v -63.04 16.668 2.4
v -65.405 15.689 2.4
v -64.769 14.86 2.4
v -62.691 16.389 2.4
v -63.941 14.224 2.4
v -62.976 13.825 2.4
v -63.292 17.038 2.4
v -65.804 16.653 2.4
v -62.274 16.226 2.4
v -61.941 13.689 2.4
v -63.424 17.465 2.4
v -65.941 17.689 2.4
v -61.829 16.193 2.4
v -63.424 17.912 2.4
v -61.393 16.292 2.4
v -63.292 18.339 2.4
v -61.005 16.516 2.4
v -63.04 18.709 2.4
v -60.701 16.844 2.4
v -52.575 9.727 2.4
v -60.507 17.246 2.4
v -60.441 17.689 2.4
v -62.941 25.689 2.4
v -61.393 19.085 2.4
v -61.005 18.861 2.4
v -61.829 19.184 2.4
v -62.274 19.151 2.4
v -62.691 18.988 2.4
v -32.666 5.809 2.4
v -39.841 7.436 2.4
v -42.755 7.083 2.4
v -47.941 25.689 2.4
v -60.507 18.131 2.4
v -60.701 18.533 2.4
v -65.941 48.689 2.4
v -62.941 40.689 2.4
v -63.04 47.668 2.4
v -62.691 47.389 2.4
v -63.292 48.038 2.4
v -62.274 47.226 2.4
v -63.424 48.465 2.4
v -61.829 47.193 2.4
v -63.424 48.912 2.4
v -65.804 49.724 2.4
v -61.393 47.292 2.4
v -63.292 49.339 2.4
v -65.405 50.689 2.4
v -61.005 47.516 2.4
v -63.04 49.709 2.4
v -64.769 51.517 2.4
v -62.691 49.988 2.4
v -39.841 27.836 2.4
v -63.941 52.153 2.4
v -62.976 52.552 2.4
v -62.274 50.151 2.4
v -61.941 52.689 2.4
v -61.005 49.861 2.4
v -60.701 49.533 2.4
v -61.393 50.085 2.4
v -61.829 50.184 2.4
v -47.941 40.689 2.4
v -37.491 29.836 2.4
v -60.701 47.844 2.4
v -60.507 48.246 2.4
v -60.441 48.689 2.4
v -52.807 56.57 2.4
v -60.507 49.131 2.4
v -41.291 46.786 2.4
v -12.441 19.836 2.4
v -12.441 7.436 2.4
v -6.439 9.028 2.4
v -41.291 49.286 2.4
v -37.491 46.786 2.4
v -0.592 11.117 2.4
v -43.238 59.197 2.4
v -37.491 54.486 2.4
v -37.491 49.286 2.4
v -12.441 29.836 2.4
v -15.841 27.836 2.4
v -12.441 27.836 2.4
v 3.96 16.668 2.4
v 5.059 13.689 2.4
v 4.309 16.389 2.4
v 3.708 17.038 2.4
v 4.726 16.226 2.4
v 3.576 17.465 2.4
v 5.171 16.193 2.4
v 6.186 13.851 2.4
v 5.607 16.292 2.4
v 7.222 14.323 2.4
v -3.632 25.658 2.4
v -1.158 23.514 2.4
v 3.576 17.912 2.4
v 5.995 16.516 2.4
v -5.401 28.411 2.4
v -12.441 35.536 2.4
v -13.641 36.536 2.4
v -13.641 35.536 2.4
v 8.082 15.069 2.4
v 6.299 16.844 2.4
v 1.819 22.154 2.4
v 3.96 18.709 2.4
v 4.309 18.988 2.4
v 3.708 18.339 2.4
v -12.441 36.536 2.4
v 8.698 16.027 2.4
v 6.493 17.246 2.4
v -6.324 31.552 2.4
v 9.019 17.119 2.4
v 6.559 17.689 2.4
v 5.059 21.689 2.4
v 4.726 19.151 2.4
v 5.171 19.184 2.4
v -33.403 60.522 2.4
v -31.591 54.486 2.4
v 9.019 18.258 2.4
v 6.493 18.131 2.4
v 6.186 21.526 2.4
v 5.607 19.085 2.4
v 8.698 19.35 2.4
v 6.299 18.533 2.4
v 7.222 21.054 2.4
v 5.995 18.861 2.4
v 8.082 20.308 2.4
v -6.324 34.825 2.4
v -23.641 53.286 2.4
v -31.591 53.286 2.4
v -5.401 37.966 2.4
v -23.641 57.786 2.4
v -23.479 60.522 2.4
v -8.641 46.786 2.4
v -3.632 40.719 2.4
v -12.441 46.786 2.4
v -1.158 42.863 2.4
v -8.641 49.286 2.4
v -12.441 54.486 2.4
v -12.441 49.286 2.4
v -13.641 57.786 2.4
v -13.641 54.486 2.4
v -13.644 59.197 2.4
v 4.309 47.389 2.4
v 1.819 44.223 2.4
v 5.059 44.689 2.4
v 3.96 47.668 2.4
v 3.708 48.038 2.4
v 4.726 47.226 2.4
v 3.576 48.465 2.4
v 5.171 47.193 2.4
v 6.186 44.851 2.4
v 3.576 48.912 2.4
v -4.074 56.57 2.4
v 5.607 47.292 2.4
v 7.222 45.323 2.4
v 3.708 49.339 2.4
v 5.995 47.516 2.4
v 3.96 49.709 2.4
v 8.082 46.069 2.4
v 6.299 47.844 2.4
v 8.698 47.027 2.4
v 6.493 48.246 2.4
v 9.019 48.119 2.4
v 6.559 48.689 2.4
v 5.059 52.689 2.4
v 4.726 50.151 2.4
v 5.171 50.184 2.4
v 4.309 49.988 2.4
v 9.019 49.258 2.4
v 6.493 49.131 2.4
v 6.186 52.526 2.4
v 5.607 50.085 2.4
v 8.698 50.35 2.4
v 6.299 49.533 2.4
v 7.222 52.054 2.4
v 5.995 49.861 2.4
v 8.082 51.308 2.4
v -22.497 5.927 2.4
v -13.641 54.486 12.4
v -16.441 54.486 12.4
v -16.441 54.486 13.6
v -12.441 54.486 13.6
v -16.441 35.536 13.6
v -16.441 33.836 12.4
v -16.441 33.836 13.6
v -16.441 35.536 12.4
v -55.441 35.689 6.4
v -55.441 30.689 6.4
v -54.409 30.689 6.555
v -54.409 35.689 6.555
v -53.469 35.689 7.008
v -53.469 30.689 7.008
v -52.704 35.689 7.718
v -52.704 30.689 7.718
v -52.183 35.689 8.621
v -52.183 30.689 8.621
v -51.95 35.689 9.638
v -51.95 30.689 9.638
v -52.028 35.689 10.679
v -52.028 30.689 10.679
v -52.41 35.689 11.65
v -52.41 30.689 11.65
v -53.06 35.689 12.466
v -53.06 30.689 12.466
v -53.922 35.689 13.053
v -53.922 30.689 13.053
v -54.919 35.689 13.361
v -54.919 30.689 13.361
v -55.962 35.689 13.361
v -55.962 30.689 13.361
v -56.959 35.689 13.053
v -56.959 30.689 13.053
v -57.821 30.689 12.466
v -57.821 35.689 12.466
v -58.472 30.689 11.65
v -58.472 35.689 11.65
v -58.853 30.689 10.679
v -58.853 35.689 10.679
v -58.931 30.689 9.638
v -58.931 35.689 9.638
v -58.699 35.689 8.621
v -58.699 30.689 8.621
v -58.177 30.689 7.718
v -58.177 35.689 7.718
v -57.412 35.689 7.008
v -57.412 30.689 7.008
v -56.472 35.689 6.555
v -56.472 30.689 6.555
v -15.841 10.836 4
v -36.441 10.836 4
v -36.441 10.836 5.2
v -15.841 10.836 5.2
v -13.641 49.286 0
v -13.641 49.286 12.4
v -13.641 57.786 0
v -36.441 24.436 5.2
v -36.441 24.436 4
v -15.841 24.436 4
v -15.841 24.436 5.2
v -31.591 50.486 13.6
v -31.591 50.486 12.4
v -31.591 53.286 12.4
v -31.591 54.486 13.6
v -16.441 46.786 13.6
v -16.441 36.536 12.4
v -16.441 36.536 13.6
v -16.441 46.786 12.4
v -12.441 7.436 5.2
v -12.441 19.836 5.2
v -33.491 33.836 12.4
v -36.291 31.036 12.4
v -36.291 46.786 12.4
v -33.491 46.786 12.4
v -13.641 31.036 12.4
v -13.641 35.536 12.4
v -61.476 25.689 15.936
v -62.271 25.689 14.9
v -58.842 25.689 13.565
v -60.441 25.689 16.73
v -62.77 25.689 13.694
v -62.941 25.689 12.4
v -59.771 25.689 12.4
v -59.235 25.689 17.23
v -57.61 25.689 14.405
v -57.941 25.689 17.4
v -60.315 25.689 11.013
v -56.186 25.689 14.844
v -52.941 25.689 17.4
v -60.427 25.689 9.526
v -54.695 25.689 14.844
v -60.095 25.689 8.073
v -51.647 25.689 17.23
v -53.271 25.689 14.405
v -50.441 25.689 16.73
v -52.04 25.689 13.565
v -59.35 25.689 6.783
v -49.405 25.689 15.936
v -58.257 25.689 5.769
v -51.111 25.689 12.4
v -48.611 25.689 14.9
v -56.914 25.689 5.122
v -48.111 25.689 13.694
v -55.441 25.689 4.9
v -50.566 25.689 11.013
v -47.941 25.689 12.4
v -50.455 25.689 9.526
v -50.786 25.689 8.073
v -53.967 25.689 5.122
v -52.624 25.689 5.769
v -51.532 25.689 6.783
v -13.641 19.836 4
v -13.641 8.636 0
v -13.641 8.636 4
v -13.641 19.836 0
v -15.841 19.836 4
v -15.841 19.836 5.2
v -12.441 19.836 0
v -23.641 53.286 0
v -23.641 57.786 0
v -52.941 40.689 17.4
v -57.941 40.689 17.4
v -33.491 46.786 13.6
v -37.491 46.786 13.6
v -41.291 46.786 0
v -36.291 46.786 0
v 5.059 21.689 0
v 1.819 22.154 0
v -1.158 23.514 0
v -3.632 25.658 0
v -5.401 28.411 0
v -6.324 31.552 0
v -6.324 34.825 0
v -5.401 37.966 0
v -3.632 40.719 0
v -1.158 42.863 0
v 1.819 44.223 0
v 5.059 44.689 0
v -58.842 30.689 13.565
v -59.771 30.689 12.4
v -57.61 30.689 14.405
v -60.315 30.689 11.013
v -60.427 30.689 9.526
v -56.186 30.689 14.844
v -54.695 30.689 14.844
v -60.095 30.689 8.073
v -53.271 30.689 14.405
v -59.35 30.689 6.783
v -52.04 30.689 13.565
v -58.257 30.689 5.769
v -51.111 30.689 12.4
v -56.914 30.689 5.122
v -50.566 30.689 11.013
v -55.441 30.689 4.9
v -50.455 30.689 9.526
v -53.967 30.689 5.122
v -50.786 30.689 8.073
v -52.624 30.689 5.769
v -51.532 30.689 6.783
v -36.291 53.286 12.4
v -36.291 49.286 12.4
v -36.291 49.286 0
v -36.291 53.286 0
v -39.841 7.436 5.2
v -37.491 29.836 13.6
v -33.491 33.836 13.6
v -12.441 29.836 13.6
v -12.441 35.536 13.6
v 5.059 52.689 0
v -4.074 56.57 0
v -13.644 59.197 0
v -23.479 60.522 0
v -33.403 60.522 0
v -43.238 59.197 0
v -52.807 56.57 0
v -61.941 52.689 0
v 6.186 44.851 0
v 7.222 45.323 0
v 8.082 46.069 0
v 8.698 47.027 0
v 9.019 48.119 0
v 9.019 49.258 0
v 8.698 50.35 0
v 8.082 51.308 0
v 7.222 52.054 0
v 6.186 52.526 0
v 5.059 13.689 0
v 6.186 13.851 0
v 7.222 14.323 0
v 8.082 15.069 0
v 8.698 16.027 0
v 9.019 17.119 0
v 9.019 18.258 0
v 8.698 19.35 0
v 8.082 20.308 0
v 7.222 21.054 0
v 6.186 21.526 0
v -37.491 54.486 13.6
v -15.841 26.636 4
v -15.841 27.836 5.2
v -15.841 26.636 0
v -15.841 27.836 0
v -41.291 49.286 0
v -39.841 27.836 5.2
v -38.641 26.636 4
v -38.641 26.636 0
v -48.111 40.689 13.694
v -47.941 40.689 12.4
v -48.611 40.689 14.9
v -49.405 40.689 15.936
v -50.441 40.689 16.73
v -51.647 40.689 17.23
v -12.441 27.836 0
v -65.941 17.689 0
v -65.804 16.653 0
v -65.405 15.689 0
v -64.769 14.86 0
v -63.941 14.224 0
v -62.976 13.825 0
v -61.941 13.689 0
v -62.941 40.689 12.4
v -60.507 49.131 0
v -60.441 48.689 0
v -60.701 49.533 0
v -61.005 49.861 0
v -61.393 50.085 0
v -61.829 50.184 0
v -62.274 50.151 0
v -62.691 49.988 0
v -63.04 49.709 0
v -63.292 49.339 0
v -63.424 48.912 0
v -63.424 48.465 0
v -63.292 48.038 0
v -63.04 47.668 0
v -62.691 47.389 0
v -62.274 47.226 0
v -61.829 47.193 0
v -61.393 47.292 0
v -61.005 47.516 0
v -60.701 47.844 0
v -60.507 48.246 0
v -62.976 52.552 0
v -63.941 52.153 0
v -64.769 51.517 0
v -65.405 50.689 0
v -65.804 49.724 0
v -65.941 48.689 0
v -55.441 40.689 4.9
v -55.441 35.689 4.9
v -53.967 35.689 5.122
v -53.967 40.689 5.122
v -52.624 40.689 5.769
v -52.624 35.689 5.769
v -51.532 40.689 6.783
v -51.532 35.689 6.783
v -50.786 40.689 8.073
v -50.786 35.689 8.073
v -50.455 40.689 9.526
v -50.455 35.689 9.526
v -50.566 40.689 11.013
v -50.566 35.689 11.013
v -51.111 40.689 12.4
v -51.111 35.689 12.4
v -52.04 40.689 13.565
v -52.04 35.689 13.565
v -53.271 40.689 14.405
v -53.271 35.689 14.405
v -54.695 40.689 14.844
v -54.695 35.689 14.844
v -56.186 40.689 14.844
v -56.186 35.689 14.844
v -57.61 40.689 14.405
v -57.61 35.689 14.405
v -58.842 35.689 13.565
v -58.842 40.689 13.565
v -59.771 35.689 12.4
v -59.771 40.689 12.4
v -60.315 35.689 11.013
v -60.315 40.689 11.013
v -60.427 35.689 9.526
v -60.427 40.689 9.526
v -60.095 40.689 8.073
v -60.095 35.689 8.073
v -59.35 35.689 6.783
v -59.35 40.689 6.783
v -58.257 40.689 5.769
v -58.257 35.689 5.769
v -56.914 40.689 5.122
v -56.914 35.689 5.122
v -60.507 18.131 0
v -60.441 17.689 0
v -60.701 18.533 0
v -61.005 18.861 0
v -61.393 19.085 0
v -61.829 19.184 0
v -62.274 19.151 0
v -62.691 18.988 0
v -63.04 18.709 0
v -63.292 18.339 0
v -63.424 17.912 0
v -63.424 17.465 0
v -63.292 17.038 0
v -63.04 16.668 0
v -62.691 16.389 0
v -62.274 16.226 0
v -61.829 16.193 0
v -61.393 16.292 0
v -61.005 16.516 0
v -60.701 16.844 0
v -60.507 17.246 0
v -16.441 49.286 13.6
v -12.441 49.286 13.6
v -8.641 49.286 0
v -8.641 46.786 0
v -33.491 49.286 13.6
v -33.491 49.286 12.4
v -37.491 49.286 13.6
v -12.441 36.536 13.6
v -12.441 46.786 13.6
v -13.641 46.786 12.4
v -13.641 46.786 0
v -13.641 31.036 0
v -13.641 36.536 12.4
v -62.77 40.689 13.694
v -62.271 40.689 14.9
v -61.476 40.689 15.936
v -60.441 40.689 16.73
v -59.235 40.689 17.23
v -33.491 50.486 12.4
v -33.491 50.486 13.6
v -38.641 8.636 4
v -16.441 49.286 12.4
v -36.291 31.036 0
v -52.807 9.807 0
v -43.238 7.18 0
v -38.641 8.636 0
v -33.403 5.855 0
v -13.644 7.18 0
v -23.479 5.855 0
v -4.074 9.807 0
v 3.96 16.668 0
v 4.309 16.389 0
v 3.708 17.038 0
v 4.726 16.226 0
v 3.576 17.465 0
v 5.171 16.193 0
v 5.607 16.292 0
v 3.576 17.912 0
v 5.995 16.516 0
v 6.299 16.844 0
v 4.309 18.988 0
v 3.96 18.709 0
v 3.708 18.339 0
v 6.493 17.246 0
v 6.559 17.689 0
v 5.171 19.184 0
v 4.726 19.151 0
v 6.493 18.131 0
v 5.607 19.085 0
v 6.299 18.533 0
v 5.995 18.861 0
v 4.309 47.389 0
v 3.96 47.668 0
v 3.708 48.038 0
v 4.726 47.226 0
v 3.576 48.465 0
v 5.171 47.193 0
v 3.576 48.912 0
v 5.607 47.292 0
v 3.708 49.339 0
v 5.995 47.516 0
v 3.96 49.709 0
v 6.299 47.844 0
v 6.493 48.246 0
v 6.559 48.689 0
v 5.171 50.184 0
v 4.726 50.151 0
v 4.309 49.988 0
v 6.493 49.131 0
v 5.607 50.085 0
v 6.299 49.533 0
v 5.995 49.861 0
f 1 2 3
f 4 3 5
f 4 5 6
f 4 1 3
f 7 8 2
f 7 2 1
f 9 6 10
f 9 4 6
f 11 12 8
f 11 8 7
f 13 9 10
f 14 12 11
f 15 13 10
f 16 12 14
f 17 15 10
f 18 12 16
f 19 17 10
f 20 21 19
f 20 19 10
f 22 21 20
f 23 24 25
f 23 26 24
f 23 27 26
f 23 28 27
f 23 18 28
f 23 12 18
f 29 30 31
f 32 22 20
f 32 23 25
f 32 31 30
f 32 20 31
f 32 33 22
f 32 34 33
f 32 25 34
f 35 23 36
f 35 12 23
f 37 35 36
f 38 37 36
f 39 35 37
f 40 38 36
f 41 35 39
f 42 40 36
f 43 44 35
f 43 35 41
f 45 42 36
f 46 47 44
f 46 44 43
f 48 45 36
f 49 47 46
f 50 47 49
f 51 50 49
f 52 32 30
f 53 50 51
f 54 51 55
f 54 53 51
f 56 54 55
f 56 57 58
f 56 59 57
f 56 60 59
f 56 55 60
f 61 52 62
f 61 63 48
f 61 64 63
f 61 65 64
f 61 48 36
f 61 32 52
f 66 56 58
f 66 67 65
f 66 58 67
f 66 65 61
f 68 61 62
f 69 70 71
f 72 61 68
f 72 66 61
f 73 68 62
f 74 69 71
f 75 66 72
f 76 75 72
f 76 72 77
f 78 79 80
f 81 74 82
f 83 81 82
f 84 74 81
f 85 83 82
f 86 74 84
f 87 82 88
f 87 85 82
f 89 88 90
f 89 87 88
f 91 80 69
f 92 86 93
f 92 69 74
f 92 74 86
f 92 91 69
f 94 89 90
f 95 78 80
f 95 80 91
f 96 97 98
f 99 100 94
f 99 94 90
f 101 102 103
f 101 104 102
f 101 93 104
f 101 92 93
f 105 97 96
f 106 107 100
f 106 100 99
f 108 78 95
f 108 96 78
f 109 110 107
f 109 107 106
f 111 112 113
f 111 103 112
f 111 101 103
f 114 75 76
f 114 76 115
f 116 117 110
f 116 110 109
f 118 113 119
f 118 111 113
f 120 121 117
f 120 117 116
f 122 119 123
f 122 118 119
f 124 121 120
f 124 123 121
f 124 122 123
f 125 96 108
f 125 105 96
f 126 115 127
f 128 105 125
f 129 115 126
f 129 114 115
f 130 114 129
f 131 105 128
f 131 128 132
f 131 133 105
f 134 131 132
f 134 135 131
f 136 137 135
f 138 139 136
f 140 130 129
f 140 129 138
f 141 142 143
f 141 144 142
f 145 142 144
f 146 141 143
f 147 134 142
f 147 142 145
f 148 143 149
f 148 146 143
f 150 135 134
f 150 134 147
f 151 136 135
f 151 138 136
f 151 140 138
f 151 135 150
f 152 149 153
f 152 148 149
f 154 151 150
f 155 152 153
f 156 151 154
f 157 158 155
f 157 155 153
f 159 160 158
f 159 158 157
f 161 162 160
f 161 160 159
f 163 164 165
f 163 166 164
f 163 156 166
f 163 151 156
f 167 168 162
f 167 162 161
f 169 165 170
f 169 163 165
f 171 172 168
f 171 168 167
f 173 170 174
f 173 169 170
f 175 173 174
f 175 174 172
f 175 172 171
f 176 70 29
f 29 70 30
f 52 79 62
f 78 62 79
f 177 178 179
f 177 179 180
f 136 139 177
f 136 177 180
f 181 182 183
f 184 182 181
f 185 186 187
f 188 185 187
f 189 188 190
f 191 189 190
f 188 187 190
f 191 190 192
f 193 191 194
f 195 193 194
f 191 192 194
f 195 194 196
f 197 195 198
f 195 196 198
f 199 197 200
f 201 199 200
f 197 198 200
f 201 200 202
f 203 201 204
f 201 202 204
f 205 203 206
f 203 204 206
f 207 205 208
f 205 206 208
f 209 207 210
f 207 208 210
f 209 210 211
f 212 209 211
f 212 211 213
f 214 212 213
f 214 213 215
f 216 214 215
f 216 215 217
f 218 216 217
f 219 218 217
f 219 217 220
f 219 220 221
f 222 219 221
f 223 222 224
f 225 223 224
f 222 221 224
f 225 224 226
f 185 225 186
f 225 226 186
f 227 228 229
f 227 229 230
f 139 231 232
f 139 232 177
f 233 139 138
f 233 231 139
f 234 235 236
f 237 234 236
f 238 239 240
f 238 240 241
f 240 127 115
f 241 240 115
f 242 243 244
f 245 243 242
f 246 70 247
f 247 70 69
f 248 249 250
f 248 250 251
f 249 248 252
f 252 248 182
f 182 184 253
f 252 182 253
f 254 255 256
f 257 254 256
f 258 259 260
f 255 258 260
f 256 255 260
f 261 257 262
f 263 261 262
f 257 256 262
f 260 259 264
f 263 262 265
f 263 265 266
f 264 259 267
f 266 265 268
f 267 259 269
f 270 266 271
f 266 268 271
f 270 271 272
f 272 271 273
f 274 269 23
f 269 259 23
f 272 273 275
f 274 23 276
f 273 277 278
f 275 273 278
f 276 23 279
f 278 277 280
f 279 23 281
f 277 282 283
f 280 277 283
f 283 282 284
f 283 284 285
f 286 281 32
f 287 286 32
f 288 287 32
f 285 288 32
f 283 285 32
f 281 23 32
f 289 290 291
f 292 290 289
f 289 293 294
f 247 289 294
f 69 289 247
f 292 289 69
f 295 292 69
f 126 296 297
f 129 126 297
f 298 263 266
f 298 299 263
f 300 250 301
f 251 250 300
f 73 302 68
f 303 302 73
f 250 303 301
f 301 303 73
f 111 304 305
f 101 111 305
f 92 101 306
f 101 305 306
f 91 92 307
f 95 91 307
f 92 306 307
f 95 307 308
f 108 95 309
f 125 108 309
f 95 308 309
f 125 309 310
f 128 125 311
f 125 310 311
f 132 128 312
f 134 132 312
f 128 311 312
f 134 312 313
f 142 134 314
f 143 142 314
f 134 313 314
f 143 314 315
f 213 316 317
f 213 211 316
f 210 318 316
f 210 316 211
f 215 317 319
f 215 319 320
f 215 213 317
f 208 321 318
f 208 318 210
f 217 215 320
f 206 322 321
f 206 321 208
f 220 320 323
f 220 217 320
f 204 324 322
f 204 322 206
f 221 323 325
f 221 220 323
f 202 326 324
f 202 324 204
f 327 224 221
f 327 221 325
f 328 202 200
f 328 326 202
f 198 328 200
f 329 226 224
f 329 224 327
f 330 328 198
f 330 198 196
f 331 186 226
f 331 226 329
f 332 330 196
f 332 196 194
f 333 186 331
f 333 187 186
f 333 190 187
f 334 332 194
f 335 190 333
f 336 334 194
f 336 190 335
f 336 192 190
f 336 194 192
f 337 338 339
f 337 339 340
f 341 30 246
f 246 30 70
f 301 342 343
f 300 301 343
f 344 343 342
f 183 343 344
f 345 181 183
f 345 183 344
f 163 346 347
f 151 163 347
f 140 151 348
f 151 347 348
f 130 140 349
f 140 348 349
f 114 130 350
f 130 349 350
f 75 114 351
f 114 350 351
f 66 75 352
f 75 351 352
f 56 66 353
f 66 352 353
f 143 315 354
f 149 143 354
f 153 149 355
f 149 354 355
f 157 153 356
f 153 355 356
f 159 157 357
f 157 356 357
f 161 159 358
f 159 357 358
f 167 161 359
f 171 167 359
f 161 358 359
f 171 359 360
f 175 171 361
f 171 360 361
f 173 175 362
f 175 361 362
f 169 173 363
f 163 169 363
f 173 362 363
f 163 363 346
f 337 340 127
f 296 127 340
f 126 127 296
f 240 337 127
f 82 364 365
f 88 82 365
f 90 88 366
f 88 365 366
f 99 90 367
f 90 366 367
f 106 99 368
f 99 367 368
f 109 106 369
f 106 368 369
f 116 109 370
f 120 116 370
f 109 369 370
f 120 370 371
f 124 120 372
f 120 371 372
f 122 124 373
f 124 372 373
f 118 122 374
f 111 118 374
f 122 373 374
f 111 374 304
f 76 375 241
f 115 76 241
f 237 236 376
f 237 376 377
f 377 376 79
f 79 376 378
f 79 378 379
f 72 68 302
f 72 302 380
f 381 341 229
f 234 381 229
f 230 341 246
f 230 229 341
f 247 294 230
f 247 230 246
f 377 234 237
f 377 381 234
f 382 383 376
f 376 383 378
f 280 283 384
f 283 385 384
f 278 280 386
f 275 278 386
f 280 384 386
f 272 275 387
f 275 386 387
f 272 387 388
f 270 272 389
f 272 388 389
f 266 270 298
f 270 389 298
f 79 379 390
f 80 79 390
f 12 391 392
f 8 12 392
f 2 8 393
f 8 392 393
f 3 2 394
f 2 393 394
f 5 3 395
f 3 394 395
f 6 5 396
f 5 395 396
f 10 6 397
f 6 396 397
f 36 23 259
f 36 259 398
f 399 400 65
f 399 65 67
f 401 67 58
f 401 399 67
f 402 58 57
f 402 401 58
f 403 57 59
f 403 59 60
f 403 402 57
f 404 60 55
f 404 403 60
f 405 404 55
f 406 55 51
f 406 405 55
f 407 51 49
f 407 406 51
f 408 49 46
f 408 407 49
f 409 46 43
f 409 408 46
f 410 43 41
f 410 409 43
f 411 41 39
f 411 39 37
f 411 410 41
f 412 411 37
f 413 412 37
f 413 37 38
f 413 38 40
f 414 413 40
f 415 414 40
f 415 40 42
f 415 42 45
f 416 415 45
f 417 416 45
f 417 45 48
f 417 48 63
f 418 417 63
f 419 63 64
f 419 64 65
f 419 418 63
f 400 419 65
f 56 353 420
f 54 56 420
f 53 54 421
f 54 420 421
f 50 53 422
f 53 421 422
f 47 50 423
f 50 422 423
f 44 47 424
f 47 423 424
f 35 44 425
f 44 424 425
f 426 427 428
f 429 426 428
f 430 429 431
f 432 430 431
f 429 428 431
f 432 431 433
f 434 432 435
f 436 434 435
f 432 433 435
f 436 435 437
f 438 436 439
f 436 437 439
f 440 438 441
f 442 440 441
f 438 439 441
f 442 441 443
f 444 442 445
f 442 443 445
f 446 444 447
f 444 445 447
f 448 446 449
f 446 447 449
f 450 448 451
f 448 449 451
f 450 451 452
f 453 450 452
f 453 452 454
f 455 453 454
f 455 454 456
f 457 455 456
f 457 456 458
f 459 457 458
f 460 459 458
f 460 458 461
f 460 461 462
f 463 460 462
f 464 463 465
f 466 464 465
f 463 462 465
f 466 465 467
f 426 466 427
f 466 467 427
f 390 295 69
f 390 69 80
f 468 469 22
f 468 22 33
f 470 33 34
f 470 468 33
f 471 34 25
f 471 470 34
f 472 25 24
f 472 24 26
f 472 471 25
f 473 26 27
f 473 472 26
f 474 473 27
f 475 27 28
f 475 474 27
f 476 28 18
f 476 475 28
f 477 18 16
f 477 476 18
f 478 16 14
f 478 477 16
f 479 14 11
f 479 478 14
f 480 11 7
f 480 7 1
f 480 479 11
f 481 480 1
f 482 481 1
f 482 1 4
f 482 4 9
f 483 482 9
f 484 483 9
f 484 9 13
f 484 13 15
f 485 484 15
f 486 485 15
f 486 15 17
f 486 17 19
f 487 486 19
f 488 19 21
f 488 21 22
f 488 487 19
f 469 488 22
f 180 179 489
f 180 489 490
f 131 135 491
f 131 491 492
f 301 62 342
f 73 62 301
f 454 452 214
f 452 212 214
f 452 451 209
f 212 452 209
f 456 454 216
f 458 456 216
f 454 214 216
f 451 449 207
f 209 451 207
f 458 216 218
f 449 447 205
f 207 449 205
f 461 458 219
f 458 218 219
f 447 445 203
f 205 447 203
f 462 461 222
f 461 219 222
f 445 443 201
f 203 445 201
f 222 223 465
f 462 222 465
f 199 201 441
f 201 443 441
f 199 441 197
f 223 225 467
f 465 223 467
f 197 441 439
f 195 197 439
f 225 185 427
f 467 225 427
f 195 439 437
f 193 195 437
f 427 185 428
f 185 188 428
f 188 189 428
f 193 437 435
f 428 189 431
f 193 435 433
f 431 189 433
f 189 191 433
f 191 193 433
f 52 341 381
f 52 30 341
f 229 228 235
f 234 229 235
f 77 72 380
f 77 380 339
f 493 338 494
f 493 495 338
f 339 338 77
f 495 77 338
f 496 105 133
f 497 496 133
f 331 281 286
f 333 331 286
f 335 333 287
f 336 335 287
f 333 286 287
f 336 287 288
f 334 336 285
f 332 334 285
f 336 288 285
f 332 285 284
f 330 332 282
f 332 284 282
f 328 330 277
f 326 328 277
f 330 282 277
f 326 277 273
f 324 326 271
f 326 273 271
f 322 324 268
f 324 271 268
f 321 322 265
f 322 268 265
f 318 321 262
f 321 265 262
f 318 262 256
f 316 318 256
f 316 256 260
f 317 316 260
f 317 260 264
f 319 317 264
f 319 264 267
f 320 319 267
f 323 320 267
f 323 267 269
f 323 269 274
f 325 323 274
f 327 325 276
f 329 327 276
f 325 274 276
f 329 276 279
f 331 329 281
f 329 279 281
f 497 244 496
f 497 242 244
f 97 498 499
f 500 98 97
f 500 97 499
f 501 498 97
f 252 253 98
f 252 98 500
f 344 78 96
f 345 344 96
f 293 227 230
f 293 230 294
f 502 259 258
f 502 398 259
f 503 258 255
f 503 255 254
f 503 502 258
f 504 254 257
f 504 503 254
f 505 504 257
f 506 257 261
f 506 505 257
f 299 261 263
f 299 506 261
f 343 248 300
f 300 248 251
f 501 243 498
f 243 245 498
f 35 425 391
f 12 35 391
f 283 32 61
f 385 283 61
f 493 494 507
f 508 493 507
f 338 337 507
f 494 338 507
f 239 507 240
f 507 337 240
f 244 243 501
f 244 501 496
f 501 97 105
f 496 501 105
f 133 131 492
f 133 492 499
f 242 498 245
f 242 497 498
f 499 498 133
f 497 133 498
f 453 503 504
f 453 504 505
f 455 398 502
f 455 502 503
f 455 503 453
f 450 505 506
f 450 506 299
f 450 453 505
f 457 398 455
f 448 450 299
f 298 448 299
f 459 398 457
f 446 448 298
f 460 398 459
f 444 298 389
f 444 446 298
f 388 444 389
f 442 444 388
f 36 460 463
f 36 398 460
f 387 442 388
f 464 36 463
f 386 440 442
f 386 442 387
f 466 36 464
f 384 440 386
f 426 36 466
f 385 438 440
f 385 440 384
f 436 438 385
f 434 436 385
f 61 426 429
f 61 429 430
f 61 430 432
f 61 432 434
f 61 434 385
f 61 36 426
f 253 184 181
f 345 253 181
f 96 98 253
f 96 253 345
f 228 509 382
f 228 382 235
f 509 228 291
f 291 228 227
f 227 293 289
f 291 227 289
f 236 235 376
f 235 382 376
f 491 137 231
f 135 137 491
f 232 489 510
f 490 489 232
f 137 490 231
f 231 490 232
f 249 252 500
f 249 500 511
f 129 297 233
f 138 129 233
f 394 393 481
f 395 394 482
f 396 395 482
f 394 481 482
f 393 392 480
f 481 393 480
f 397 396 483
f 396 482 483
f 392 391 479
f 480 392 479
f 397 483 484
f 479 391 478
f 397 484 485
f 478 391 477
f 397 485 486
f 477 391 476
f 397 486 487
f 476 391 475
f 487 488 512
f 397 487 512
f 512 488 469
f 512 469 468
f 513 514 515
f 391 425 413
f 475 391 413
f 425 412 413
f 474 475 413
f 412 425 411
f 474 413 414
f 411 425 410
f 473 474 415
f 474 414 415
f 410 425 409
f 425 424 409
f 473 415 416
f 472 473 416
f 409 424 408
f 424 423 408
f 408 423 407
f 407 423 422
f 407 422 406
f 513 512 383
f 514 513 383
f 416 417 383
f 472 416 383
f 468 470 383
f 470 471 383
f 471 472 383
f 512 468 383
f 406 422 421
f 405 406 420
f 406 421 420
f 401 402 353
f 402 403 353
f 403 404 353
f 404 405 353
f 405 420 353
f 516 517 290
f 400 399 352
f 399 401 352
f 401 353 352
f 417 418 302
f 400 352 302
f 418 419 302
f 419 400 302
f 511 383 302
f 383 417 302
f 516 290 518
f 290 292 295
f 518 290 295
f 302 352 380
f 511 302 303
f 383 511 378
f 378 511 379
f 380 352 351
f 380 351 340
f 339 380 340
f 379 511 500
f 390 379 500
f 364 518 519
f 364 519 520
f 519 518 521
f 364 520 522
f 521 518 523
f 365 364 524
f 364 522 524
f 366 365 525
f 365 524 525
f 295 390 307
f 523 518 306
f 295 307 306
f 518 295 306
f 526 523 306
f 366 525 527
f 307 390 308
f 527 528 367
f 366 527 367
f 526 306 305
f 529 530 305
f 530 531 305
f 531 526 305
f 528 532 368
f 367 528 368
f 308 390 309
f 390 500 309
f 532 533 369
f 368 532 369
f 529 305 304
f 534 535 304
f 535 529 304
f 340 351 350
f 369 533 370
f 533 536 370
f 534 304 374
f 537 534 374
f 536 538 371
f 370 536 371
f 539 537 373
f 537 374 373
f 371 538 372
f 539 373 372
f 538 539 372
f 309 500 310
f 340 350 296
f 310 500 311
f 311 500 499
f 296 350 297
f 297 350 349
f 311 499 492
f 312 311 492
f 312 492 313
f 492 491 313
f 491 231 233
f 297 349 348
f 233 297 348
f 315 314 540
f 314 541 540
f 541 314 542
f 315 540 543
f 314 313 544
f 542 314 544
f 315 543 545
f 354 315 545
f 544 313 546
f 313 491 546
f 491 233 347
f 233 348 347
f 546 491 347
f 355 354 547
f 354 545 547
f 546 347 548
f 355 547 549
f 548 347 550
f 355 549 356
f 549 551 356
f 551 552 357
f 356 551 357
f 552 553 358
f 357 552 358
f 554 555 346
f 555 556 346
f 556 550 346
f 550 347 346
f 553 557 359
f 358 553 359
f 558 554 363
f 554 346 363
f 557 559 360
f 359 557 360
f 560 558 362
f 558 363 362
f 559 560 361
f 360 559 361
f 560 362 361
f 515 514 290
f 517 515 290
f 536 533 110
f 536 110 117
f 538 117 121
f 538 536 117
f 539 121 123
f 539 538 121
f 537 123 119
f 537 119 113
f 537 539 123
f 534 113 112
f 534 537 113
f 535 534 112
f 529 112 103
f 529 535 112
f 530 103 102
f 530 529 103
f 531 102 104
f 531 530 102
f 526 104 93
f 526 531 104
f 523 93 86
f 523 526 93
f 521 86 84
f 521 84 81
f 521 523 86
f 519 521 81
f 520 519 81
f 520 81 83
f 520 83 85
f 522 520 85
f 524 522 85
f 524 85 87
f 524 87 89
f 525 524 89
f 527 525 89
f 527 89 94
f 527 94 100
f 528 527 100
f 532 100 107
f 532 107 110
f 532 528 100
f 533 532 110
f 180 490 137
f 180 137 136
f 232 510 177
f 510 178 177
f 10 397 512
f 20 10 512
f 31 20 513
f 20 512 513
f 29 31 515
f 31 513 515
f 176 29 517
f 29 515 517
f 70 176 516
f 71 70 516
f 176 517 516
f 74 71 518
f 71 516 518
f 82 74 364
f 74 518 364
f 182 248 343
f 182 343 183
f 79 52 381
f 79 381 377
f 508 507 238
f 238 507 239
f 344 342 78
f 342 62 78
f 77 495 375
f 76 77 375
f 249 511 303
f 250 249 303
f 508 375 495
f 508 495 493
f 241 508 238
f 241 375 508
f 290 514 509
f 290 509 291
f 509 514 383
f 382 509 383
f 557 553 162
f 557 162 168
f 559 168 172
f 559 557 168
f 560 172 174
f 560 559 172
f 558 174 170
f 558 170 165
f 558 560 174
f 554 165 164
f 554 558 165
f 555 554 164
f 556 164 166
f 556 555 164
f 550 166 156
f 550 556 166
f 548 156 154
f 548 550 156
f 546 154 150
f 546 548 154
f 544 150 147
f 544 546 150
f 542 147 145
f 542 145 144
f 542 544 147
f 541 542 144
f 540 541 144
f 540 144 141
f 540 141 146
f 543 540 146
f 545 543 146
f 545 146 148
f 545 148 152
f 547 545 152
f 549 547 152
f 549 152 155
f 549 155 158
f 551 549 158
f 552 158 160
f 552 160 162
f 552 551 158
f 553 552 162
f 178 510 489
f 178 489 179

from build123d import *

# Parameters (mm, degrees)
CROQUIS1_R                 = 1.5
SALIENTE_EXTRUIR1_DEPTH    = 2.4
CROQUIS3_W                 = 25.05
CROQUIS3_H                 = 24.65
CROQUIS3_W_2               = 22.65
CROQUIS3_H_2               = 22.25
SALIENTE_EXTRUIR2_DEPTH    = 10
CROQUIS4_W                 = 25.05
CROQUIS4_H                 = 24.65
CROQUIS4_W_2               = 17.05
CROQUIS4_H_2               = 16.65
SALIENTE_EXTRUIR3_DEPTH    = 1.2
CORTAR_EXTRUIR1_START      = -11.2
CROQUIS5_W                 = 4
CROQUIS5_H                 = 2.5
CROQUIS5_W_2               = 15.15
CROQUIS5_H_2               = 4
CROQUIS5_H_3               = 1
CORTAR_EXTRUIR1_DEPTH      = 11.2
CROQUIS6_W                 = 27.4
CROQUIS6_H                 = 20.4
CROQUIS6_W_2               = 25
CROQUIS6_H_2               = 18
SALIENTE_EXTRUIR4_DEPTH    = 1.6
CROQUIS8_W                 = 15
CROQUIS8_H                 = 15
SALIENTE_EXTRUIR5_DEPTH    = 15
CROQUIS10_R                = 5
CORTAR_EXTRUIR2_DEPTH      = 5
CORTAR_EXTRUIR3_START      = -10
CROQUIS10_2_R              = 5
CORTAR_EXTRUIR3_DEPTH      = 5
CROQUIS11_R                = 3.5
CORTAR_EXTRUIR4_DEPTH      = 5
CORTAR_EXTRUIR5_DEPTH      = 2.4
CORTAR_EXTRUIR6_DEPTH      = 10
CORTAR_EXTRUIR6_DEPTH_BACK = 2.4
CROQUIS13_W                = 10
CROQUIS13_H                = 4.5
CROQUIS14_W                = 27.4
CROQUIS14_H                = 20.4
CROQUIS14_W_2              = 20.6
CROQUIS14_H_2              = 13.6
SALIENTE_EXTRUIR6_DEPTH    = 1.2
CROQUIS15_W                = 25
CROQUIS15_H                = 18
CORTAR_EXTRUIR7_DEPTH      = 2.4
CORTAR_EXTRUIR8_START      = -5.2
CROQUIS16_W                = 3.4
CROQUIS16_H                = 8
CORTAR_EXTRUIR8_DEPTH      = 5.2
REDONDEO1_R                = 5


with BuildPart() as part:
    # Croquis1 → Saliente-Extruir1 (new body)
    with BuildSketch(Plane.XY):
        with BuildLine():
            Line((-65.940699516, 48.688511327), (-65.940699516, 17.688511327))
            ThreePointArc((-65.940699516, 17.688511327), (-64.76912664, 14.860084202), (-61.940699516, 13.688511327))
            ThreePointArc((-61.940699516, 13.688511327), (-28.440699516, 5.688511327), (5.059300484, 13.688511327))
            ThreePointArc((5.059300484, 13.688511327), (9.059300484, 17.688511327), (5.059300484, 21.688511327))
            ThreePointArc((5.059300484, 21.688511327), (-6.440699516, 33.188511327), (5.059300484, 44.688511327))
            ThreePointArc((5.059300484, 44.688511327), (9.059300484, 48.688511327), (5.059300484, 52.688511327))
            ThreePointArc((5.059300484, 52.688511327), (-28.440699516, 60.688511327), (-61.940699516, 52.688511327))
            ThreePointArc((-61.940699516, 52.688511327), (-64.76912664, 51.516938452), (-65.940699516, 48.688511327))
        make_face()
        with Locations((-61.940699516, 48.688511327)):
            Circle(CROQUIS1_R, mode=Mode.SUBTRACT)
        with Locations((5.059300484, 48.688511327)):
            Circle(CROQUIS1_R, mode=Mode.SUBTRACT)
        with Locations((5.059300484, 17.688511327)):
            Circle(CROQUIS1_R, mode=Mode.SUBTRACT)
        with Locations((-61.940699516, 17.688511327)):
            Circle(CROQUIS1_R, mode=Mode.SUBTRACT)
    extrude(amount=SALIENTE_EXTRUIR1_DEPTH)

    # Croquis3 → Saliente-Extruir2 (add)
    with BuildSketch(Plane.XY.offset(2.4)):
        with Locations((-24.965699516, 42.160543548)):
            Rectangle(CROQUIS3_W, CROQUIS3_H)
        with Locations((-24.965699516, 42.160543548)):
            Rectangle(CROQUIS3_W_2, CROQUIS3_H_2, mode=Mode.SUBTRACT)
    extrude(amount=SALIENTE_EXTRUIR2_DEPTH)

    # Croquis4 → Saliente-Extruir3 (add)
    with BuildSketch(Plane.XY.offset(12.4)):
        with Locations((-24.965699516, 42.160543548)):
            Rectangle(CROQUIS4_W, CROQUIS4_H)
        with Locations((-24.965699516, 42.160543548)):
            Rectangle(CROQUIS4_W_2, CROQUIS4_H_2, mode=Mode.SUBTRACT)
    extrude(amount=SALIENTE_EXTRUIR3_DEPTH)

    # Croquis5 → Cortar-Extruir1 (cut)
    with BuildSketch(Plane.XY.offset(13.6).offset(CORTAR_EXTRUIR1_START)):
        with Locations((-35.490699516, 48.035543548)):
            Rectangle(CROQUIS5_W, CROQUIS5_H)
        with Locations((-24.015699516, 52.485543548)):
            Rectangle(CROQUIS5_W_2, CROQUIS5_H_2)
        with Locations((-14.440699516, 36.035543548)):
            Rectangle(CROQUIS5_W, CROQUIS5_H_3)
        with Locations((-14.440699516, 48.035543548)):
            Rectangle(CROQUIS5_W, CROQUIS5_H)
    extrude(amount=CORTAR_EXTRUIR1_DEPTH, mode=Mode.SUBTRACT)

    # Croquis6 → Saliente-Extruir4 (add)
    with BuildSketch(Plane.XY.offset(2.4)):
        with Locations((-26.140699516, 17.635543548)):
            Rectangle(CROQUIS6_W, CROQUIS6_H)
        with Locations((-26.140699516, 17.635543548)):
            Rectangle(CROQUIS6_W_2, CROQUIS6_H_2, mode=Mode.SUBTRACT)
    extrude(amount=SALIENTE_EXTRUIR4_DEPTH)

    # Croquis8 → Saliente-Extruir5 (add)
    with BuildSketch(Plane.XY.offset(2.4)):
        with Locations((-55.440699516, 33.188511327)):
            Rectangle(CROQUIS8_W, CROQUIS8_H)
    extrude(amount=SALIENTE_EXTRUIR5_DEPTH)

    # Croquis10 → Cortar-Extruir2 (cut)
    with BuildSketch(Plane.XZ.offset(-25.688511327)):
        with Locations(Location((-55.440699516, 9.9, 0), (0, 0, 270))):
            Circle(CROQUIS10_R)
    extrude(amount=-CORTAR_EXTRUIR2_DEPTH, mode=Mode.SUBTRACT)

    # Croquis10<2> → Cortar-Extruir3 (cut)
    with BuildSketch(Plane.XZ.offset(-25.688511327).offset(CORTAR_EXTRUIR3_START)):
        with Locations(Location((-55.440699516, 9.9, 0), (0, 0, 270))):
            Circle(CROQUIS10_2_R)
    extrude(amount=-CORTAR_EXTRUIR3_DEPTH, mode=Mode.SUBTRACT)

    # Croquis11 → Cortar-Extruir4 (cut)
    with BuildSketch(Plane.XZ.offset(-30.688511327)):
        with Locations(Location((-55.440699516, 9.9, 0), (0, 0, 270))):
            Circle(CROQUIS11_R)
    extrude(amount=-CORTAR_EXTRUIR4_DEPTH, mode=Mode.SUBTRACT)

    # Croquis12 → Cortar-Extruir5 (cut)
    with BuildSketch(Plane.XY.offset(2.4)):
        Polygon((-36.290699516, 53.285543548), (-13.640699516, 53.285543548), (-13.640699516, 49.285543548), (-8.640699516, 49.285543548), (-8.640699516, 46.785543548), (-13.640699516, 46.785543548), (-13.640699516, 31.035543548), (-36.290699516, 31.035543548), (-36.290699516, 46.785543548), (-41.290699516, 46.785543548), (-41.290699516, 49.285543548), (-36.290699516, 49.285543548), align=None)
    extrude(amount=-CORTAR_EXTRUIR5_DEPTH, mode=Mode.SUBTRACT)

    # Croquis13 → Cortar-Extruir6 (cut, two sides: drawn at the far end of the back side and taken through both)
    with BuildSketch(Plane.XY.offset(2.4).offset(-CORTAR_EXTRUIR6_DEPTH_BACK)):
        with Locations((-18.640699516, 55.535543548)):
            Rectangle(CROQUIS13_W, CROQUIS13_H)
    extrude(amount=CORTAR_EXTRUIR6_DEPTH + CORTAR_EXTRUIR6_DEPTH_BACK, mode=Mode.SUBTRACT)

    # Croquis14 → Saliente-Extruir6 (add)
    with BuildSketch(Plane.XY.offset(4)):
        with Locations((-26.140699516, 17.635543548)):
            Rectangle(CROQUIS14_W, CROQUIS14_H)
        with Locations((-26.140699516, 17.635543548)):
            Rectangle(CROQUIS14_W_2, CROQUIS14_H_2, mode=Mode.SUBTRACT)
    extrude(amount=SALIENTE_EXTRUIR6_DEPTH)

    # Croquis15 → Cortar-Extruir7 (cut)
    with BuildSketch(Plane.XY.offset(2.4)):
        with Locations((-26.140699516, 17.635543548)):
            Rectangle(CROQUIS15_W, CROQUIS15_H)
    extrude(amount=-CORTAR_EXTRUIR7_DEPTH, mode=Mode.SUBTRACT)

    # Croquis16 → Cortar-Extruir8 (cut)
    with BuildSketch(Plane.XY.offset(5.2).offset(CORTAR_EXTRUIR8_START)):
        with Locations((-14.140699516, 23.835543548)):
            Rectangle(CROQUIS16_W, CROQUIS16_H)
    extrude(amount=CORTAR_EXTRUIR8_DEPTH, mode=Mode.SUBTRACT)

    # Redondeo1
    redondeo1_edges = [part.edges().sort_by_distance(p)[0] for p in [
        (-62.940699516, 33.188511327, 17.4),
        (-47.940699516, 33.188511327, 17.4),
    ]]
    fillet(redondeo1_edges, radius=REDONDEO1_R)


solid = part.part
